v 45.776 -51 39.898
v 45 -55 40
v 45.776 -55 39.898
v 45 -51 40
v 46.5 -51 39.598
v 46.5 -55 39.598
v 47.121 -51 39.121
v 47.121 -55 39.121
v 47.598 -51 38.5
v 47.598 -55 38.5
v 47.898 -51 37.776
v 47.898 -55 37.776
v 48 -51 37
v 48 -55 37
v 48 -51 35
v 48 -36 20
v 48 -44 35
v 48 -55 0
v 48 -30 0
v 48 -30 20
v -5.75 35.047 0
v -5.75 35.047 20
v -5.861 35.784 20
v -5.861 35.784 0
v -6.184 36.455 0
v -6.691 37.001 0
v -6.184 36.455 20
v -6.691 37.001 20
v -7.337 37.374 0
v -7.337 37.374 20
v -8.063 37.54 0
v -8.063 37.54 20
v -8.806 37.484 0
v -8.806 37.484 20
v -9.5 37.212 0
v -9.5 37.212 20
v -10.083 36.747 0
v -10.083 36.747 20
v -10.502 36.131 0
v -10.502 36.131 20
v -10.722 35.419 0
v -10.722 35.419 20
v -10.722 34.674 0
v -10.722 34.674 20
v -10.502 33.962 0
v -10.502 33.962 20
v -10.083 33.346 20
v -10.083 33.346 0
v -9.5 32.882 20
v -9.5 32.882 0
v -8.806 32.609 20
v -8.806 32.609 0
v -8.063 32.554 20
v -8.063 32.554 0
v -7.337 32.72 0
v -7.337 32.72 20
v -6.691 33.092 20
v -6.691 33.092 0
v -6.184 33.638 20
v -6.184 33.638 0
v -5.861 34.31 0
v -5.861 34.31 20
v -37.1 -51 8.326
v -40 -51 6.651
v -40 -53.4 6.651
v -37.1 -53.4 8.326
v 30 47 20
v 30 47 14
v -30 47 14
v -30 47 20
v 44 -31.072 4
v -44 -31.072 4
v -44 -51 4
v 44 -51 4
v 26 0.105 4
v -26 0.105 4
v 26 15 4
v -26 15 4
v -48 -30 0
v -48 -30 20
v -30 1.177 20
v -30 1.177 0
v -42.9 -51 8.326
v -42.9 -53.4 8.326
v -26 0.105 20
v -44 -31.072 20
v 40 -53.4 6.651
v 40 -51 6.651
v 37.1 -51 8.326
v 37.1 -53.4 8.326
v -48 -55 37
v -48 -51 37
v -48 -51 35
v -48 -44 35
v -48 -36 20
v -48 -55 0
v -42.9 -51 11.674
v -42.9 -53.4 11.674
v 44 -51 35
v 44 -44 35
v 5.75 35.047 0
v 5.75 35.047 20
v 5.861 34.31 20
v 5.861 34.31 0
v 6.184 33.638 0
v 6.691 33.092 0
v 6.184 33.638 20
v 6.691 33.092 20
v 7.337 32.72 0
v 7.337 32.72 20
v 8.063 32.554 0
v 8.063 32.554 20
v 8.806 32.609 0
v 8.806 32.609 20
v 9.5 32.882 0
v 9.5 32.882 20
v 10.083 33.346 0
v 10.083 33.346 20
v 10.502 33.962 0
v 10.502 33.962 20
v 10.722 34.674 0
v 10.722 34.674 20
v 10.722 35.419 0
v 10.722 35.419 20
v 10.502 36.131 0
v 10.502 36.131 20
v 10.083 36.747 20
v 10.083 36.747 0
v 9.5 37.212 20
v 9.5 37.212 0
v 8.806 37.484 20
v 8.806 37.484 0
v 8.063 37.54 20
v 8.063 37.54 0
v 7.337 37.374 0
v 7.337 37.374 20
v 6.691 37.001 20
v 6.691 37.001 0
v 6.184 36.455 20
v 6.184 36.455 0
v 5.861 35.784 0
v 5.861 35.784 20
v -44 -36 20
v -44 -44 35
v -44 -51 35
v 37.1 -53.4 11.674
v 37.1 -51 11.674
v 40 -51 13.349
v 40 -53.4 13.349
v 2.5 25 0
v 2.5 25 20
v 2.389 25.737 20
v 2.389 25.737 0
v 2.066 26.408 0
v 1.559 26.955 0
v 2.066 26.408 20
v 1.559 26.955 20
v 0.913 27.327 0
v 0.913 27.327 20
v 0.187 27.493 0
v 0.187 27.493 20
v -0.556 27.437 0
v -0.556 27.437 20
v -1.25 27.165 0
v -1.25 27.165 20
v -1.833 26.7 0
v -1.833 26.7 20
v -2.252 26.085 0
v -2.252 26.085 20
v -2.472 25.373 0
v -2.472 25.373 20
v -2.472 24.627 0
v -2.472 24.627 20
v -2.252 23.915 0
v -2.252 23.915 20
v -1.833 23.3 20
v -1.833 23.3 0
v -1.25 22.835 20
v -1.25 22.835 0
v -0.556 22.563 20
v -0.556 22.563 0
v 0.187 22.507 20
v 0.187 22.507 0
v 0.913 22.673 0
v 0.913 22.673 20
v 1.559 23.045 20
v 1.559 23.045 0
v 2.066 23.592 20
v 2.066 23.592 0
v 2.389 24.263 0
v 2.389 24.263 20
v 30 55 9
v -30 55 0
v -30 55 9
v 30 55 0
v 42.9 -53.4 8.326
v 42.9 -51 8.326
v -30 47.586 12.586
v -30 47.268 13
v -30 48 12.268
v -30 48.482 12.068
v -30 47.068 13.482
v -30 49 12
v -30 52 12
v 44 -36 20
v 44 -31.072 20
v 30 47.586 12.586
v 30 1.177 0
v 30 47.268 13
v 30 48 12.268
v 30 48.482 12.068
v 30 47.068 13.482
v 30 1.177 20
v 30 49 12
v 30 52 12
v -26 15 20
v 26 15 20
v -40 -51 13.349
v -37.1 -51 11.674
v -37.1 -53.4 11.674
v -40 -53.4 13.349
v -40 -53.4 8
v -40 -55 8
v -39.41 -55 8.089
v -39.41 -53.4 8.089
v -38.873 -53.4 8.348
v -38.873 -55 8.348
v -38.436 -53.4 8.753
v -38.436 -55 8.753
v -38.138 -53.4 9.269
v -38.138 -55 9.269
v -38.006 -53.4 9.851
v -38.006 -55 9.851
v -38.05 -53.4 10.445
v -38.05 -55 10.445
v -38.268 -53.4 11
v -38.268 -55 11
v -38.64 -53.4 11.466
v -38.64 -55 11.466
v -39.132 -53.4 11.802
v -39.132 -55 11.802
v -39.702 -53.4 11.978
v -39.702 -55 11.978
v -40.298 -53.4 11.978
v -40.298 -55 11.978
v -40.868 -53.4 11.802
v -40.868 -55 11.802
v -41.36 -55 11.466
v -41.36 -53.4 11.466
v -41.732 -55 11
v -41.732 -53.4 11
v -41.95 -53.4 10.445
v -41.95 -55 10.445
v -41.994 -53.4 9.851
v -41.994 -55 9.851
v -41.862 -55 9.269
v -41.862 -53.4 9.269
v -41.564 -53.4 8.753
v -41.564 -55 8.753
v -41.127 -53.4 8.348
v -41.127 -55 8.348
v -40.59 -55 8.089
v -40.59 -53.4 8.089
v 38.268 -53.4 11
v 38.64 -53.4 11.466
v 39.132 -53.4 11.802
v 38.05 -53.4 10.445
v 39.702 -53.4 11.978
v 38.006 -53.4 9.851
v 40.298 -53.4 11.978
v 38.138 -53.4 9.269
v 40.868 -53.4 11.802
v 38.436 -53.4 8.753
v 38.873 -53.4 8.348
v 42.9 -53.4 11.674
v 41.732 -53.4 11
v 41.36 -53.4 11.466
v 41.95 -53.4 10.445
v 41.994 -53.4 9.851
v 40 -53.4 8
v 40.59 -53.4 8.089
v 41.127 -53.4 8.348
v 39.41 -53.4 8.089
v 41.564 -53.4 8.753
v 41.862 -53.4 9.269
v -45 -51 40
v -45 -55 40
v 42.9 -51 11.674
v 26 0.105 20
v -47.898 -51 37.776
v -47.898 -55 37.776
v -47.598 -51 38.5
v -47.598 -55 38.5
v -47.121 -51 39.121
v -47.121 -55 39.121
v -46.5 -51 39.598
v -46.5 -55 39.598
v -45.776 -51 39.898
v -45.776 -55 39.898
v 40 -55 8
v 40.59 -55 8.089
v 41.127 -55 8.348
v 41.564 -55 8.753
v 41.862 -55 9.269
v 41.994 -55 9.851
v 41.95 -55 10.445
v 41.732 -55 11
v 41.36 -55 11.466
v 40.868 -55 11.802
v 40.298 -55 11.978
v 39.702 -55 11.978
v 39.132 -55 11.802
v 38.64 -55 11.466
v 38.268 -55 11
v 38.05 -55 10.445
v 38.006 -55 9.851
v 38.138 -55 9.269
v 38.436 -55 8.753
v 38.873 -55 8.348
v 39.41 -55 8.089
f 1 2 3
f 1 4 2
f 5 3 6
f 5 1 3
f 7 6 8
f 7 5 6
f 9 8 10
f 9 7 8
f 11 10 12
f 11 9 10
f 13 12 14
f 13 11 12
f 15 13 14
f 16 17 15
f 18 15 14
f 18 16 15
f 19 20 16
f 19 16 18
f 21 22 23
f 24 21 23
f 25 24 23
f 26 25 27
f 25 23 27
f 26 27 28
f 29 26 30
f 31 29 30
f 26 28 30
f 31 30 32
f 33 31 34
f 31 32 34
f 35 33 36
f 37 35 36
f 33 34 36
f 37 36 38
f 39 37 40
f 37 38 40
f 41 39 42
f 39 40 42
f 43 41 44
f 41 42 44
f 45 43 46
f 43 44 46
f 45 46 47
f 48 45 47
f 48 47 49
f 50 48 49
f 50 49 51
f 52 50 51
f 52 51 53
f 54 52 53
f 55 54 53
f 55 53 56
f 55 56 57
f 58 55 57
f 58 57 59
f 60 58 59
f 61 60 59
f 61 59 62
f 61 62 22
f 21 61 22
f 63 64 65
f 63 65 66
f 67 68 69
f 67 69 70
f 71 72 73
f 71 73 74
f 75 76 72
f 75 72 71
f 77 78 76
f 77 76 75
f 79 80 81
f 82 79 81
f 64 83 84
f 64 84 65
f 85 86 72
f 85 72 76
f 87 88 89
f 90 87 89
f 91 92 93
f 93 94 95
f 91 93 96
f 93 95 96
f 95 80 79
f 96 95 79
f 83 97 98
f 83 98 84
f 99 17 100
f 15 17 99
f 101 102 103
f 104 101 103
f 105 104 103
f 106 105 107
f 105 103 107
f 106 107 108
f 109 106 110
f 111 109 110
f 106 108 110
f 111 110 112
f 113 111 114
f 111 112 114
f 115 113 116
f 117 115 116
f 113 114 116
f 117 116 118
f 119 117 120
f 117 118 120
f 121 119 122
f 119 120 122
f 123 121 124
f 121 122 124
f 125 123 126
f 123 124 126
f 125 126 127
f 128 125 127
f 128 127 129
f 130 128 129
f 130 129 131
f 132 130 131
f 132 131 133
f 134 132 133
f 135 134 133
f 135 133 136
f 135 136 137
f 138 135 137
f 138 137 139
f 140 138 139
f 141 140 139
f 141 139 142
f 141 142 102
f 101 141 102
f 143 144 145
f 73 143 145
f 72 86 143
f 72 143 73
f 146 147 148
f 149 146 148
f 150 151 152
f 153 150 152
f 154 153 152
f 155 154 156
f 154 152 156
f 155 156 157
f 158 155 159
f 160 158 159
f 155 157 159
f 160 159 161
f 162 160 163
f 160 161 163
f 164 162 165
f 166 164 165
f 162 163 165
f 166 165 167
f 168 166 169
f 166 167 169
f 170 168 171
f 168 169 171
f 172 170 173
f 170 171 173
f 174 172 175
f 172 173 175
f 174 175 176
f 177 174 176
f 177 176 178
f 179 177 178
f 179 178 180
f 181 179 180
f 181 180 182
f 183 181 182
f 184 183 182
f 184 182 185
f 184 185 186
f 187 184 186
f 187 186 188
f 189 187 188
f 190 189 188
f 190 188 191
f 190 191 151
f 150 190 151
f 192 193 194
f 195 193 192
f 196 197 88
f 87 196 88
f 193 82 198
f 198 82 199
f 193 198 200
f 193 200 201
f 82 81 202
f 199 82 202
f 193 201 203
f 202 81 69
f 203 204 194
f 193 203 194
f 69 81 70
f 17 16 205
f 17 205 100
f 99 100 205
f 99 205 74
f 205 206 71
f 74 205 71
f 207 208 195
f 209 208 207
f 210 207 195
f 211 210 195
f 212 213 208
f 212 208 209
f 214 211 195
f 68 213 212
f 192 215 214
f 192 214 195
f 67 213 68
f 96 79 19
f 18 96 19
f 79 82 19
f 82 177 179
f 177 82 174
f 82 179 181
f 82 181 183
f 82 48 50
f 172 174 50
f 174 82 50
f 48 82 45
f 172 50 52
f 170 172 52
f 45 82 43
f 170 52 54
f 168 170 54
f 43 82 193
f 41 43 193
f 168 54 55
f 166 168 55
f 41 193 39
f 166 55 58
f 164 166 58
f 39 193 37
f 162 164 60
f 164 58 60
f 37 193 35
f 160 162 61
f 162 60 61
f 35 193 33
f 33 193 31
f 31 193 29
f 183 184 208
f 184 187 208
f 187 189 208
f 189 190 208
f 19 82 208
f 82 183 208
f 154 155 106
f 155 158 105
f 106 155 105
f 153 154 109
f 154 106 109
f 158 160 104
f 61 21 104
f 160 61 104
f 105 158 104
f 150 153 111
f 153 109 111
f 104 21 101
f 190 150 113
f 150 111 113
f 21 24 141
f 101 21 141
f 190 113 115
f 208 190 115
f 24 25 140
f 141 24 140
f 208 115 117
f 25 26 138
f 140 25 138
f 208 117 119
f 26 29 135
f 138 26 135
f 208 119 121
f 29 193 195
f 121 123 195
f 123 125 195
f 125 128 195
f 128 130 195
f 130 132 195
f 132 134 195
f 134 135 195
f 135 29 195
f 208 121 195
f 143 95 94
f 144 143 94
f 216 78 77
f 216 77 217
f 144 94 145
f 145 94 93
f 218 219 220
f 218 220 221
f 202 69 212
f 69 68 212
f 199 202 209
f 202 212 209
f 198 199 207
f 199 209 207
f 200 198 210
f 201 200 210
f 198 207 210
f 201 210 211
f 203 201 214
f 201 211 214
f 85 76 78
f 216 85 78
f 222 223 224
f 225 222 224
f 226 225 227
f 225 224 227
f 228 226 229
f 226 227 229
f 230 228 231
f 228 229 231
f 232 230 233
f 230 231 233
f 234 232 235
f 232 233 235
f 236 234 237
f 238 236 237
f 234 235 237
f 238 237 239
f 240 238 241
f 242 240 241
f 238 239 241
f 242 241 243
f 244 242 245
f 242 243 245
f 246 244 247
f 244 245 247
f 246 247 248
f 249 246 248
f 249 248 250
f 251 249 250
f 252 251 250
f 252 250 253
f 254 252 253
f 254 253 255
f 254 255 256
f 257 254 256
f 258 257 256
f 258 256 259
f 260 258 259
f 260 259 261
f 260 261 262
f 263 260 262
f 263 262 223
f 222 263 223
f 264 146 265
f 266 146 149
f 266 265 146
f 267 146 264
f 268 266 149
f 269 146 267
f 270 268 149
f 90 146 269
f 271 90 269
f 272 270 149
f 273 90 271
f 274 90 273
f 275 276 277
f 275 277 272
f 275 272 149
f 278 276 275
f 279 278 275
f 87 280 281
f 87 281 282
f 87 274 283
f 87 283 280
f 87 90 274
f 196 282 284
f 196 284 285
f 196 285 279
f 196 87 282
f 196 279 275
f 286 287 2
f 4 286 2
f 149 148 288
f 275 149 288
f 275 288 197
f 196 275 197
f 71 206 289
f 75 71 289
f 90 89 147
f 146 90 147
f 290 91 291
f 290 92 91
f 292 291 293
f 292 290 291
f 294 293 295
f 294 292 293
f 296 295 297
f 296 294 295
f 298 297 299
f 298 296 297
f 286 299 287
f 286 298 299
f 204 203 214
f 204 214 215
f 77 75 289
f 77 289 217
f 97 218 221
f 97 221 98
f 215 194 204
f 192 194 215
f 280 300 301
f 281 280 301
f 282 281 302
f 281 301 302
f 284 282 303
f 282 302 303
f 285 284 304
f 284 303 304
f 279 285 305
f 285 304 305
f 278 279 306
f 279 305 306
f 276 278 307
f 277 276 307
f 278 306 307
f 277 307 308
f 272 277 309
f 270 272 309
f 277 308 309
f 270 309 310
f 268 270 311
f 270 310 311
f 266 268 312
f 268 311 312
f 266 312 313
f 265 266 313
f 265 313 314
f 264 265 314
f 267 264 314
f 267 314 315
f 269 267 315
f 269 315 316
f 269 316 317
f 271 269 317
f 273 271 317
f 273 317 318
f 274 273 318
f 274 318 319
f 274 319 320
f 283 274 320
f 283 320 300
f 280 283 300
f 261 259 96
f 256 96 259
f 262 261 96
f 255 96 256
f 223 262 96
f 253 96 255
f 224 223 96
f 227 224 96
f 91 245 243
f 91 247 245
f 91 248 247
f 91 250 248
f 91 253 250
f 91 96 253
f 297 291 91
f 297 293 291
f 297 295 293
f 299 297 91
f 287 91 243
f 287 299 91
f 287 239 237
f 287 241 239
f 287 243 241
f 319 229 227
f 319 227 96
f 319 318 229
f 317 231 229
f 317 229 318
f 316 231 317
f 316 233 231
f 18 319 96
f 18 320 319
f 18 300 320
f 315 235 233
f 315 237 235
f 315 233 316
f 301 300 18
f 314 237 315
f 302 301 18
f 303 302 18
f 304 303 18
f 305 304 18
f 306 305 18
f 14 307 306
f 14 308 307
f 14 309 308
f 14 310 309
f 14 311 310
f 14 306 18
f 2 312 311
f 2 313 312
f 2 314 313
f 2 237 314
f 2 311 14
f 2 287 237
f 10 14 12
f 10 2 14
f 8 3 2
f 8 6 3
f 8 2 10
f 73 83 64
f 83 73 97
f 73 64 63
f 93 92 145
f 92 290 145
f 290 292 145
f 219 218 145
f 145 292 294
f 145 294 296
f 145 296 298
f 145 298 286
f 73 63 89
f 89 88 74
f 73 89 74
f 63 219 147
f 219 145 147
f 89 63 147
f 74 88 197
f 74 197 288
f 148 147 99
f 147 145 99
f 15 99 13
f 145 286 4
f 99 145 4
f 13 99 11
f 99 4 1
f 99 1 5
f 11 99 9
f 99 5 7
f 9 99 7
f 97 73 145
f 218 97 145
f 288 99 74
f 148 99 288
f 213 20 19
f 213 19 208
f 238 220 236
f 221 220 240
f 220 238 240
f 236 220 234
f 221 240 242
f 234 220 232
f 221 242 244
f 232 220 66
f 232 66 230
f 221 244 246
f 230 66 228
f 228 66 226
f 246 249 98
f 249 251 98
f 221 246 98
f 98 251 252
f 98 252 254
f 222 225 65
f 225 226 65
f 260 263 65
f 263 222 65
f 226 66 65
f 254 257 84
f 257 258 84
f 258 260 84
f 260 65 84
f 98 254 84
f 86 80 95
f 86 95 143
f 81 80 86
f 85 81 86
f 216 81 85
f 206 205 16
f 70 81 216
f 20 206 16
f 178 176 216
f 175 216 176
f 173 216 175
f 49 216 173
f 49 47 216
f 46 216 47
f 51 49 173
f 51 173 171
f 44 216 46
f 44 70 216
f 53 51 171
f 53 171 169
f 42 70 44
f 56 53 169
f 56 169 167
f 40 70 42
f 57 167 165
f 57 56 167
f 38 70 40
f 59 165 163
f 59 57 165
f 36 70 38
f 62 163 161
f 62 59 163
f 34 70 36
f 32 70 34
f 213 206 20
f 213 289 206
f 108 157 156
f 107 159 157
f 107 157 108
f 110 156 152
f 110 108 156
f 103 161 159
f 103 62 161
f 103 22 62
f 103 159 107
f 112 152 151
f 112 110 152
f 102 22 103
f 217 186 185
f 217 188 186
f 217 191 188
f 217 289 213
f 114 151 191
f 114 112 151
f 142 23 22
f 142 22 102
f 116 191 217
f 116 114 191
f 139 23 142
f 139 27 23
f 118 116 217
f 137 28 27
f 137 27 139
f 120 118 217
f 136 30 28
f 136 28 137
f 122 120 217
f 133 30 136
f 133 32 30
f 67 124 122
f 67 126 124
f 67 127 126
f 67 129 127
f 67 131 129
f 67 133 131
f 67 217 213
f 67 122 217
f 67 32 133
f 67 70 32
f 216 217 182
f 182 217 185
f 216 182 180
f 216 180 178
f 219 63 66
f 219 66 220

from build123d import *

# Parameters (mm, degrees)
SKETCH_1_W                 = 96
SKETCH_1_H                 = 110
EXTRUDE_1_DEPTH            = 20
CUT_EXTRUDE_1_DEPTH        = 20
SHELL_1_T                  = -4
SHELL_1_THICKNESS_2_FACE_W = 16
SHELL_1_THICKNESS_2_FACE_H = 52
SHELL_1_THICKNESS_2_DEPTH  = 36
CUT_EXTRUDE_2_REACH        = 123.672
SKETCH_3_R                 = 2
CUT_EXTRUDE_3_REACH        = 77.69
SKETCH_5_R                 = 2.5
SKETCH_6_W                 = 96
SKETCH_6_H                 = 20
EXTRUDE_2_DEPTH            = 4
EXTRUDE_3_DEPTH            = 4
FILLET_1_R                 = 3
CUT_EXTRUDE_4_DEPTH        = 2.4
SKETCH_10_W                = 8
SKETCH_10_H                = 8
CUT_EXTRUDE_5_DEPTH        = 104.484298326
FILLET_2_R                 = 2
CHAMFER_1_SIZE             = 3


with BuildPart() as part:
    # 草图1 → 凸台-拉伸1 (new body)
    with BuildSketch(Plane.XY):
        Rectangle(SKETCH_1_W, SKETCH_1_H)
    extrude(amount=EXTRUDE_1_DEPTH)

    # 草图2 → 切除-拉伸1 (cut)
    with BuildSketch(Plane.XY.offset(20)):
        Polygon((-48, -30), (-30, 1.176914536), (-30, 55), (-48, 55), align=None)
        Polygon((48, 55), (48, -30), (30, 1.176914536), (30, 55), align=None)
    extrude(amount=-CUT_EXTRUDE_1_DEPTH, mode=Mode.SUBTRACT)

    # 抽壳1
    shell_1_openings = [part.faces().sort_by_distance(p)[0] for p in [
        (0, -6.109962386, 20),
    ]]
    offset(amount=SHELL_1_T, openings=shell_1_openings, kind=Kind.INTERSECTION)

    # 抽壳1 thickness 2 face (on inner face of the shell) → 抽壳1 thickness 2 (add)
    with BuildSketch(Plane(origin=(0, 51, 12), x_dir=(0, 0, 1), z_dir=(0, 1, 0))):
        Rectangle(SHELL_1_THICKNESS_2_FACE_W, SHELL_1_THICKNESS_2_FACE_H)
    extrude(amount=-SHELL_1_THICKNESS_2_DEPTH)

    # 草图3 → 切除-拉伸2 (cut, up to next)
    with BuildSketch(Plane.XZ.offset(55), mode=Mode.PRIVATE) as cut_extrude_2_sk1:
        with Locations(Location((-40, 10, 0), (0, 0, 270))):
            Circle(SKETCH_3_R)
    cut_extrude_2_tool1 = extrude(cut_extrude_2_sk1.sketch, amount=-CUT_EXTRUDE_2_REACH, mode=Mode.PRIVATE) & part.part
    # 草图3 → 切除-拉伸2 (cut, up to next)
    with BuildSketch(Plane.XZ.offset(55), mode=Mode.PRIVATE) as cut_extrude_2_sk2:
        with Locations(Location((40, 10, 0), (0, 0, 270))):
            Circle(SKETCH_3_R)
    cut_extrude_2_tool2 = extrude(cut_extrude_2_sk2.sketch, amount=-CUT_EXTRUDE_2_REACH, mode=Mode.PRIVATE) & part.part
    add(cut_extrude_2_tool1.solids().sort_by_distance((-40, -55, 10))[0], mode=Mode.SUBTRACT)
    add(cut_extrude_2_tool2.solids().sort_by_distance((40, -55, 10))[0], mode=Mode.SUBTRACT)

    # 草图5 → 切除-拉伸3 (cut, up to next)
    with BuildSketch(Plane.XY.offset(20), mode=Mode.PRIVATE) as cut_extrude_3_sk1:
        with Locations((0, 25)):
            Circle(SKETCH_5_R)
    cut_extrude_3_tool1 = extrude(cut_extrude_3_sk1.sketch, amount=-CUT_EXTRUDE_3_REACH, mode=Mode.PRIVATE) & part.part
    # 草图5 → 切除-拉伸3 (cut, up to next)
    with BuildSketch(Plane.XY.offset(20), mode=Mode.PRIVATE) as cut_extrude_3_sk2:
        with Locations((-8.25, 35.046765649)):
            Circle(SKETCH_5_R)
    cut_extrude_3_tool2 = extrude(cut_extrude_3_sk2.sketch, amount=-CUT_EXTRUDE_3_REACH, mode=Mode.PRIVATE) & part.part
    # 草图5 → 切除-拉伸3 (cut, up to next)
    with BuildSketch(Plane.XY.offset(20), mode=Mode.PRIVATE) as cut_extrude_3_sk3:
        with Locations(Location((8.25, 35.046765649, 0), (0, 0, 180))):
            Circle(SKETCH_5_R)
    cut_extrude_3_tool3 = extrude(cut_extrude_3_sk3.sketch, amount=-CUT_EXTRUDE_3_REACH, mode=Mode.PRIVATE) & part.part
    add(cut_extrude_3_tool1.solids().sort_by_distance((0, 25, 20))[0], mode=Mode.SUBTRACT)
    add(cut_extrude_3_tool2.solids().sort_by_distance((-8.25, 35.046766, 20))[0], mode=Mode.SUBTRACT)
    add(cut_extrude_3_tool3.solids().sort_by_distance((8.25, 35.046766, 20))[0], mode=Mode.SUBTRACT)

    # 草图6 → 凸台-拉伸2 (add)
    with BuildSketch(Plane.XZ.offset(55)):
        with Locations((0, 30)):
            Rectangle(SKETCH_6_W, SKETCH_6_H)
    extrude(amount=-EXTRUDE_2_DEPTH)

    # 草图7 → 凸台-拉伸3 (add)
    with BuildSketch(Plane.ZY.offset(48)):
        Polygon((20, -36), (35, -44), (35, -51), (20, -51), align=None)
    extrude_3 = extrude(amount=-EXTRUDE_3_DEPTH)

    # 镜向1: 凸台-拉伸3 across plane
    add(extrude_3.mirror(Plane(origin=(0, 0, 0), x_dir=(0, 0, 1), z_dir=(1, 0, 0))))

    # 圆角1
    fillet_1_edges = [part.edges().sort_by_distance(p)[0] for p in [
        (-48, -53, 40),
        (48, -53, 40),
    ]]
    fillet(fillet_1_edges, radius=FILLET_1_R)

    # 草图8 → 切除-拉伸4 (cut)
    with BuildSketch(Plane(origin=(0, -51, 0), x_dir=(1, 0, 0), z_dir=(0, 1, 0))):
        Polygon((40, -13.348631561), (42.9, -11.674315781), (42.9, -8.325684219), (40, -6.651368439), (37.1, -8.325684219), (37.1, -11.674315781), align=None)
        Polygon((-37.1, -11.674315781), (-40, -13.348631561), (-42.9, -11.674315781), (-42.9, -8.325684219), (-40, -6.651368439), (-37.1, -8.325684219), align=None)
    extrude(amount=-CUT_EXTRUDE_4_DEPTH, mode=Mode.SUBTRACT)

    # 草图10 → 切除-拉伸5 (cut, through all)
    with BuildSketch(Plane.ZY.offset(30)):
        with Locations((16, 51)):
            Rectangle(SKETCH_10_W, SKETCH_10_H)
    extrude(amount=-CUT_EXTRUDE_5_DEPTH, mode=Mode.SUBTRACT)

    # 圆角2
    fillet_2_edges = [part.edges().sort_by_distance(p)[0] for p in [
        (0, 47, 12),
    ]]
    fillet(fillet_2_edges, radius=FILLET_2_R)

    # 倒角1
    chamfer_1_edges = [part.edges().sort_by_distance(p)[0] for p in [
        (0, 55, 12),
    ]]
    chamfer(chamfer_1_edges, length=CHAMFER_1_SIZE)


solid = part.part
